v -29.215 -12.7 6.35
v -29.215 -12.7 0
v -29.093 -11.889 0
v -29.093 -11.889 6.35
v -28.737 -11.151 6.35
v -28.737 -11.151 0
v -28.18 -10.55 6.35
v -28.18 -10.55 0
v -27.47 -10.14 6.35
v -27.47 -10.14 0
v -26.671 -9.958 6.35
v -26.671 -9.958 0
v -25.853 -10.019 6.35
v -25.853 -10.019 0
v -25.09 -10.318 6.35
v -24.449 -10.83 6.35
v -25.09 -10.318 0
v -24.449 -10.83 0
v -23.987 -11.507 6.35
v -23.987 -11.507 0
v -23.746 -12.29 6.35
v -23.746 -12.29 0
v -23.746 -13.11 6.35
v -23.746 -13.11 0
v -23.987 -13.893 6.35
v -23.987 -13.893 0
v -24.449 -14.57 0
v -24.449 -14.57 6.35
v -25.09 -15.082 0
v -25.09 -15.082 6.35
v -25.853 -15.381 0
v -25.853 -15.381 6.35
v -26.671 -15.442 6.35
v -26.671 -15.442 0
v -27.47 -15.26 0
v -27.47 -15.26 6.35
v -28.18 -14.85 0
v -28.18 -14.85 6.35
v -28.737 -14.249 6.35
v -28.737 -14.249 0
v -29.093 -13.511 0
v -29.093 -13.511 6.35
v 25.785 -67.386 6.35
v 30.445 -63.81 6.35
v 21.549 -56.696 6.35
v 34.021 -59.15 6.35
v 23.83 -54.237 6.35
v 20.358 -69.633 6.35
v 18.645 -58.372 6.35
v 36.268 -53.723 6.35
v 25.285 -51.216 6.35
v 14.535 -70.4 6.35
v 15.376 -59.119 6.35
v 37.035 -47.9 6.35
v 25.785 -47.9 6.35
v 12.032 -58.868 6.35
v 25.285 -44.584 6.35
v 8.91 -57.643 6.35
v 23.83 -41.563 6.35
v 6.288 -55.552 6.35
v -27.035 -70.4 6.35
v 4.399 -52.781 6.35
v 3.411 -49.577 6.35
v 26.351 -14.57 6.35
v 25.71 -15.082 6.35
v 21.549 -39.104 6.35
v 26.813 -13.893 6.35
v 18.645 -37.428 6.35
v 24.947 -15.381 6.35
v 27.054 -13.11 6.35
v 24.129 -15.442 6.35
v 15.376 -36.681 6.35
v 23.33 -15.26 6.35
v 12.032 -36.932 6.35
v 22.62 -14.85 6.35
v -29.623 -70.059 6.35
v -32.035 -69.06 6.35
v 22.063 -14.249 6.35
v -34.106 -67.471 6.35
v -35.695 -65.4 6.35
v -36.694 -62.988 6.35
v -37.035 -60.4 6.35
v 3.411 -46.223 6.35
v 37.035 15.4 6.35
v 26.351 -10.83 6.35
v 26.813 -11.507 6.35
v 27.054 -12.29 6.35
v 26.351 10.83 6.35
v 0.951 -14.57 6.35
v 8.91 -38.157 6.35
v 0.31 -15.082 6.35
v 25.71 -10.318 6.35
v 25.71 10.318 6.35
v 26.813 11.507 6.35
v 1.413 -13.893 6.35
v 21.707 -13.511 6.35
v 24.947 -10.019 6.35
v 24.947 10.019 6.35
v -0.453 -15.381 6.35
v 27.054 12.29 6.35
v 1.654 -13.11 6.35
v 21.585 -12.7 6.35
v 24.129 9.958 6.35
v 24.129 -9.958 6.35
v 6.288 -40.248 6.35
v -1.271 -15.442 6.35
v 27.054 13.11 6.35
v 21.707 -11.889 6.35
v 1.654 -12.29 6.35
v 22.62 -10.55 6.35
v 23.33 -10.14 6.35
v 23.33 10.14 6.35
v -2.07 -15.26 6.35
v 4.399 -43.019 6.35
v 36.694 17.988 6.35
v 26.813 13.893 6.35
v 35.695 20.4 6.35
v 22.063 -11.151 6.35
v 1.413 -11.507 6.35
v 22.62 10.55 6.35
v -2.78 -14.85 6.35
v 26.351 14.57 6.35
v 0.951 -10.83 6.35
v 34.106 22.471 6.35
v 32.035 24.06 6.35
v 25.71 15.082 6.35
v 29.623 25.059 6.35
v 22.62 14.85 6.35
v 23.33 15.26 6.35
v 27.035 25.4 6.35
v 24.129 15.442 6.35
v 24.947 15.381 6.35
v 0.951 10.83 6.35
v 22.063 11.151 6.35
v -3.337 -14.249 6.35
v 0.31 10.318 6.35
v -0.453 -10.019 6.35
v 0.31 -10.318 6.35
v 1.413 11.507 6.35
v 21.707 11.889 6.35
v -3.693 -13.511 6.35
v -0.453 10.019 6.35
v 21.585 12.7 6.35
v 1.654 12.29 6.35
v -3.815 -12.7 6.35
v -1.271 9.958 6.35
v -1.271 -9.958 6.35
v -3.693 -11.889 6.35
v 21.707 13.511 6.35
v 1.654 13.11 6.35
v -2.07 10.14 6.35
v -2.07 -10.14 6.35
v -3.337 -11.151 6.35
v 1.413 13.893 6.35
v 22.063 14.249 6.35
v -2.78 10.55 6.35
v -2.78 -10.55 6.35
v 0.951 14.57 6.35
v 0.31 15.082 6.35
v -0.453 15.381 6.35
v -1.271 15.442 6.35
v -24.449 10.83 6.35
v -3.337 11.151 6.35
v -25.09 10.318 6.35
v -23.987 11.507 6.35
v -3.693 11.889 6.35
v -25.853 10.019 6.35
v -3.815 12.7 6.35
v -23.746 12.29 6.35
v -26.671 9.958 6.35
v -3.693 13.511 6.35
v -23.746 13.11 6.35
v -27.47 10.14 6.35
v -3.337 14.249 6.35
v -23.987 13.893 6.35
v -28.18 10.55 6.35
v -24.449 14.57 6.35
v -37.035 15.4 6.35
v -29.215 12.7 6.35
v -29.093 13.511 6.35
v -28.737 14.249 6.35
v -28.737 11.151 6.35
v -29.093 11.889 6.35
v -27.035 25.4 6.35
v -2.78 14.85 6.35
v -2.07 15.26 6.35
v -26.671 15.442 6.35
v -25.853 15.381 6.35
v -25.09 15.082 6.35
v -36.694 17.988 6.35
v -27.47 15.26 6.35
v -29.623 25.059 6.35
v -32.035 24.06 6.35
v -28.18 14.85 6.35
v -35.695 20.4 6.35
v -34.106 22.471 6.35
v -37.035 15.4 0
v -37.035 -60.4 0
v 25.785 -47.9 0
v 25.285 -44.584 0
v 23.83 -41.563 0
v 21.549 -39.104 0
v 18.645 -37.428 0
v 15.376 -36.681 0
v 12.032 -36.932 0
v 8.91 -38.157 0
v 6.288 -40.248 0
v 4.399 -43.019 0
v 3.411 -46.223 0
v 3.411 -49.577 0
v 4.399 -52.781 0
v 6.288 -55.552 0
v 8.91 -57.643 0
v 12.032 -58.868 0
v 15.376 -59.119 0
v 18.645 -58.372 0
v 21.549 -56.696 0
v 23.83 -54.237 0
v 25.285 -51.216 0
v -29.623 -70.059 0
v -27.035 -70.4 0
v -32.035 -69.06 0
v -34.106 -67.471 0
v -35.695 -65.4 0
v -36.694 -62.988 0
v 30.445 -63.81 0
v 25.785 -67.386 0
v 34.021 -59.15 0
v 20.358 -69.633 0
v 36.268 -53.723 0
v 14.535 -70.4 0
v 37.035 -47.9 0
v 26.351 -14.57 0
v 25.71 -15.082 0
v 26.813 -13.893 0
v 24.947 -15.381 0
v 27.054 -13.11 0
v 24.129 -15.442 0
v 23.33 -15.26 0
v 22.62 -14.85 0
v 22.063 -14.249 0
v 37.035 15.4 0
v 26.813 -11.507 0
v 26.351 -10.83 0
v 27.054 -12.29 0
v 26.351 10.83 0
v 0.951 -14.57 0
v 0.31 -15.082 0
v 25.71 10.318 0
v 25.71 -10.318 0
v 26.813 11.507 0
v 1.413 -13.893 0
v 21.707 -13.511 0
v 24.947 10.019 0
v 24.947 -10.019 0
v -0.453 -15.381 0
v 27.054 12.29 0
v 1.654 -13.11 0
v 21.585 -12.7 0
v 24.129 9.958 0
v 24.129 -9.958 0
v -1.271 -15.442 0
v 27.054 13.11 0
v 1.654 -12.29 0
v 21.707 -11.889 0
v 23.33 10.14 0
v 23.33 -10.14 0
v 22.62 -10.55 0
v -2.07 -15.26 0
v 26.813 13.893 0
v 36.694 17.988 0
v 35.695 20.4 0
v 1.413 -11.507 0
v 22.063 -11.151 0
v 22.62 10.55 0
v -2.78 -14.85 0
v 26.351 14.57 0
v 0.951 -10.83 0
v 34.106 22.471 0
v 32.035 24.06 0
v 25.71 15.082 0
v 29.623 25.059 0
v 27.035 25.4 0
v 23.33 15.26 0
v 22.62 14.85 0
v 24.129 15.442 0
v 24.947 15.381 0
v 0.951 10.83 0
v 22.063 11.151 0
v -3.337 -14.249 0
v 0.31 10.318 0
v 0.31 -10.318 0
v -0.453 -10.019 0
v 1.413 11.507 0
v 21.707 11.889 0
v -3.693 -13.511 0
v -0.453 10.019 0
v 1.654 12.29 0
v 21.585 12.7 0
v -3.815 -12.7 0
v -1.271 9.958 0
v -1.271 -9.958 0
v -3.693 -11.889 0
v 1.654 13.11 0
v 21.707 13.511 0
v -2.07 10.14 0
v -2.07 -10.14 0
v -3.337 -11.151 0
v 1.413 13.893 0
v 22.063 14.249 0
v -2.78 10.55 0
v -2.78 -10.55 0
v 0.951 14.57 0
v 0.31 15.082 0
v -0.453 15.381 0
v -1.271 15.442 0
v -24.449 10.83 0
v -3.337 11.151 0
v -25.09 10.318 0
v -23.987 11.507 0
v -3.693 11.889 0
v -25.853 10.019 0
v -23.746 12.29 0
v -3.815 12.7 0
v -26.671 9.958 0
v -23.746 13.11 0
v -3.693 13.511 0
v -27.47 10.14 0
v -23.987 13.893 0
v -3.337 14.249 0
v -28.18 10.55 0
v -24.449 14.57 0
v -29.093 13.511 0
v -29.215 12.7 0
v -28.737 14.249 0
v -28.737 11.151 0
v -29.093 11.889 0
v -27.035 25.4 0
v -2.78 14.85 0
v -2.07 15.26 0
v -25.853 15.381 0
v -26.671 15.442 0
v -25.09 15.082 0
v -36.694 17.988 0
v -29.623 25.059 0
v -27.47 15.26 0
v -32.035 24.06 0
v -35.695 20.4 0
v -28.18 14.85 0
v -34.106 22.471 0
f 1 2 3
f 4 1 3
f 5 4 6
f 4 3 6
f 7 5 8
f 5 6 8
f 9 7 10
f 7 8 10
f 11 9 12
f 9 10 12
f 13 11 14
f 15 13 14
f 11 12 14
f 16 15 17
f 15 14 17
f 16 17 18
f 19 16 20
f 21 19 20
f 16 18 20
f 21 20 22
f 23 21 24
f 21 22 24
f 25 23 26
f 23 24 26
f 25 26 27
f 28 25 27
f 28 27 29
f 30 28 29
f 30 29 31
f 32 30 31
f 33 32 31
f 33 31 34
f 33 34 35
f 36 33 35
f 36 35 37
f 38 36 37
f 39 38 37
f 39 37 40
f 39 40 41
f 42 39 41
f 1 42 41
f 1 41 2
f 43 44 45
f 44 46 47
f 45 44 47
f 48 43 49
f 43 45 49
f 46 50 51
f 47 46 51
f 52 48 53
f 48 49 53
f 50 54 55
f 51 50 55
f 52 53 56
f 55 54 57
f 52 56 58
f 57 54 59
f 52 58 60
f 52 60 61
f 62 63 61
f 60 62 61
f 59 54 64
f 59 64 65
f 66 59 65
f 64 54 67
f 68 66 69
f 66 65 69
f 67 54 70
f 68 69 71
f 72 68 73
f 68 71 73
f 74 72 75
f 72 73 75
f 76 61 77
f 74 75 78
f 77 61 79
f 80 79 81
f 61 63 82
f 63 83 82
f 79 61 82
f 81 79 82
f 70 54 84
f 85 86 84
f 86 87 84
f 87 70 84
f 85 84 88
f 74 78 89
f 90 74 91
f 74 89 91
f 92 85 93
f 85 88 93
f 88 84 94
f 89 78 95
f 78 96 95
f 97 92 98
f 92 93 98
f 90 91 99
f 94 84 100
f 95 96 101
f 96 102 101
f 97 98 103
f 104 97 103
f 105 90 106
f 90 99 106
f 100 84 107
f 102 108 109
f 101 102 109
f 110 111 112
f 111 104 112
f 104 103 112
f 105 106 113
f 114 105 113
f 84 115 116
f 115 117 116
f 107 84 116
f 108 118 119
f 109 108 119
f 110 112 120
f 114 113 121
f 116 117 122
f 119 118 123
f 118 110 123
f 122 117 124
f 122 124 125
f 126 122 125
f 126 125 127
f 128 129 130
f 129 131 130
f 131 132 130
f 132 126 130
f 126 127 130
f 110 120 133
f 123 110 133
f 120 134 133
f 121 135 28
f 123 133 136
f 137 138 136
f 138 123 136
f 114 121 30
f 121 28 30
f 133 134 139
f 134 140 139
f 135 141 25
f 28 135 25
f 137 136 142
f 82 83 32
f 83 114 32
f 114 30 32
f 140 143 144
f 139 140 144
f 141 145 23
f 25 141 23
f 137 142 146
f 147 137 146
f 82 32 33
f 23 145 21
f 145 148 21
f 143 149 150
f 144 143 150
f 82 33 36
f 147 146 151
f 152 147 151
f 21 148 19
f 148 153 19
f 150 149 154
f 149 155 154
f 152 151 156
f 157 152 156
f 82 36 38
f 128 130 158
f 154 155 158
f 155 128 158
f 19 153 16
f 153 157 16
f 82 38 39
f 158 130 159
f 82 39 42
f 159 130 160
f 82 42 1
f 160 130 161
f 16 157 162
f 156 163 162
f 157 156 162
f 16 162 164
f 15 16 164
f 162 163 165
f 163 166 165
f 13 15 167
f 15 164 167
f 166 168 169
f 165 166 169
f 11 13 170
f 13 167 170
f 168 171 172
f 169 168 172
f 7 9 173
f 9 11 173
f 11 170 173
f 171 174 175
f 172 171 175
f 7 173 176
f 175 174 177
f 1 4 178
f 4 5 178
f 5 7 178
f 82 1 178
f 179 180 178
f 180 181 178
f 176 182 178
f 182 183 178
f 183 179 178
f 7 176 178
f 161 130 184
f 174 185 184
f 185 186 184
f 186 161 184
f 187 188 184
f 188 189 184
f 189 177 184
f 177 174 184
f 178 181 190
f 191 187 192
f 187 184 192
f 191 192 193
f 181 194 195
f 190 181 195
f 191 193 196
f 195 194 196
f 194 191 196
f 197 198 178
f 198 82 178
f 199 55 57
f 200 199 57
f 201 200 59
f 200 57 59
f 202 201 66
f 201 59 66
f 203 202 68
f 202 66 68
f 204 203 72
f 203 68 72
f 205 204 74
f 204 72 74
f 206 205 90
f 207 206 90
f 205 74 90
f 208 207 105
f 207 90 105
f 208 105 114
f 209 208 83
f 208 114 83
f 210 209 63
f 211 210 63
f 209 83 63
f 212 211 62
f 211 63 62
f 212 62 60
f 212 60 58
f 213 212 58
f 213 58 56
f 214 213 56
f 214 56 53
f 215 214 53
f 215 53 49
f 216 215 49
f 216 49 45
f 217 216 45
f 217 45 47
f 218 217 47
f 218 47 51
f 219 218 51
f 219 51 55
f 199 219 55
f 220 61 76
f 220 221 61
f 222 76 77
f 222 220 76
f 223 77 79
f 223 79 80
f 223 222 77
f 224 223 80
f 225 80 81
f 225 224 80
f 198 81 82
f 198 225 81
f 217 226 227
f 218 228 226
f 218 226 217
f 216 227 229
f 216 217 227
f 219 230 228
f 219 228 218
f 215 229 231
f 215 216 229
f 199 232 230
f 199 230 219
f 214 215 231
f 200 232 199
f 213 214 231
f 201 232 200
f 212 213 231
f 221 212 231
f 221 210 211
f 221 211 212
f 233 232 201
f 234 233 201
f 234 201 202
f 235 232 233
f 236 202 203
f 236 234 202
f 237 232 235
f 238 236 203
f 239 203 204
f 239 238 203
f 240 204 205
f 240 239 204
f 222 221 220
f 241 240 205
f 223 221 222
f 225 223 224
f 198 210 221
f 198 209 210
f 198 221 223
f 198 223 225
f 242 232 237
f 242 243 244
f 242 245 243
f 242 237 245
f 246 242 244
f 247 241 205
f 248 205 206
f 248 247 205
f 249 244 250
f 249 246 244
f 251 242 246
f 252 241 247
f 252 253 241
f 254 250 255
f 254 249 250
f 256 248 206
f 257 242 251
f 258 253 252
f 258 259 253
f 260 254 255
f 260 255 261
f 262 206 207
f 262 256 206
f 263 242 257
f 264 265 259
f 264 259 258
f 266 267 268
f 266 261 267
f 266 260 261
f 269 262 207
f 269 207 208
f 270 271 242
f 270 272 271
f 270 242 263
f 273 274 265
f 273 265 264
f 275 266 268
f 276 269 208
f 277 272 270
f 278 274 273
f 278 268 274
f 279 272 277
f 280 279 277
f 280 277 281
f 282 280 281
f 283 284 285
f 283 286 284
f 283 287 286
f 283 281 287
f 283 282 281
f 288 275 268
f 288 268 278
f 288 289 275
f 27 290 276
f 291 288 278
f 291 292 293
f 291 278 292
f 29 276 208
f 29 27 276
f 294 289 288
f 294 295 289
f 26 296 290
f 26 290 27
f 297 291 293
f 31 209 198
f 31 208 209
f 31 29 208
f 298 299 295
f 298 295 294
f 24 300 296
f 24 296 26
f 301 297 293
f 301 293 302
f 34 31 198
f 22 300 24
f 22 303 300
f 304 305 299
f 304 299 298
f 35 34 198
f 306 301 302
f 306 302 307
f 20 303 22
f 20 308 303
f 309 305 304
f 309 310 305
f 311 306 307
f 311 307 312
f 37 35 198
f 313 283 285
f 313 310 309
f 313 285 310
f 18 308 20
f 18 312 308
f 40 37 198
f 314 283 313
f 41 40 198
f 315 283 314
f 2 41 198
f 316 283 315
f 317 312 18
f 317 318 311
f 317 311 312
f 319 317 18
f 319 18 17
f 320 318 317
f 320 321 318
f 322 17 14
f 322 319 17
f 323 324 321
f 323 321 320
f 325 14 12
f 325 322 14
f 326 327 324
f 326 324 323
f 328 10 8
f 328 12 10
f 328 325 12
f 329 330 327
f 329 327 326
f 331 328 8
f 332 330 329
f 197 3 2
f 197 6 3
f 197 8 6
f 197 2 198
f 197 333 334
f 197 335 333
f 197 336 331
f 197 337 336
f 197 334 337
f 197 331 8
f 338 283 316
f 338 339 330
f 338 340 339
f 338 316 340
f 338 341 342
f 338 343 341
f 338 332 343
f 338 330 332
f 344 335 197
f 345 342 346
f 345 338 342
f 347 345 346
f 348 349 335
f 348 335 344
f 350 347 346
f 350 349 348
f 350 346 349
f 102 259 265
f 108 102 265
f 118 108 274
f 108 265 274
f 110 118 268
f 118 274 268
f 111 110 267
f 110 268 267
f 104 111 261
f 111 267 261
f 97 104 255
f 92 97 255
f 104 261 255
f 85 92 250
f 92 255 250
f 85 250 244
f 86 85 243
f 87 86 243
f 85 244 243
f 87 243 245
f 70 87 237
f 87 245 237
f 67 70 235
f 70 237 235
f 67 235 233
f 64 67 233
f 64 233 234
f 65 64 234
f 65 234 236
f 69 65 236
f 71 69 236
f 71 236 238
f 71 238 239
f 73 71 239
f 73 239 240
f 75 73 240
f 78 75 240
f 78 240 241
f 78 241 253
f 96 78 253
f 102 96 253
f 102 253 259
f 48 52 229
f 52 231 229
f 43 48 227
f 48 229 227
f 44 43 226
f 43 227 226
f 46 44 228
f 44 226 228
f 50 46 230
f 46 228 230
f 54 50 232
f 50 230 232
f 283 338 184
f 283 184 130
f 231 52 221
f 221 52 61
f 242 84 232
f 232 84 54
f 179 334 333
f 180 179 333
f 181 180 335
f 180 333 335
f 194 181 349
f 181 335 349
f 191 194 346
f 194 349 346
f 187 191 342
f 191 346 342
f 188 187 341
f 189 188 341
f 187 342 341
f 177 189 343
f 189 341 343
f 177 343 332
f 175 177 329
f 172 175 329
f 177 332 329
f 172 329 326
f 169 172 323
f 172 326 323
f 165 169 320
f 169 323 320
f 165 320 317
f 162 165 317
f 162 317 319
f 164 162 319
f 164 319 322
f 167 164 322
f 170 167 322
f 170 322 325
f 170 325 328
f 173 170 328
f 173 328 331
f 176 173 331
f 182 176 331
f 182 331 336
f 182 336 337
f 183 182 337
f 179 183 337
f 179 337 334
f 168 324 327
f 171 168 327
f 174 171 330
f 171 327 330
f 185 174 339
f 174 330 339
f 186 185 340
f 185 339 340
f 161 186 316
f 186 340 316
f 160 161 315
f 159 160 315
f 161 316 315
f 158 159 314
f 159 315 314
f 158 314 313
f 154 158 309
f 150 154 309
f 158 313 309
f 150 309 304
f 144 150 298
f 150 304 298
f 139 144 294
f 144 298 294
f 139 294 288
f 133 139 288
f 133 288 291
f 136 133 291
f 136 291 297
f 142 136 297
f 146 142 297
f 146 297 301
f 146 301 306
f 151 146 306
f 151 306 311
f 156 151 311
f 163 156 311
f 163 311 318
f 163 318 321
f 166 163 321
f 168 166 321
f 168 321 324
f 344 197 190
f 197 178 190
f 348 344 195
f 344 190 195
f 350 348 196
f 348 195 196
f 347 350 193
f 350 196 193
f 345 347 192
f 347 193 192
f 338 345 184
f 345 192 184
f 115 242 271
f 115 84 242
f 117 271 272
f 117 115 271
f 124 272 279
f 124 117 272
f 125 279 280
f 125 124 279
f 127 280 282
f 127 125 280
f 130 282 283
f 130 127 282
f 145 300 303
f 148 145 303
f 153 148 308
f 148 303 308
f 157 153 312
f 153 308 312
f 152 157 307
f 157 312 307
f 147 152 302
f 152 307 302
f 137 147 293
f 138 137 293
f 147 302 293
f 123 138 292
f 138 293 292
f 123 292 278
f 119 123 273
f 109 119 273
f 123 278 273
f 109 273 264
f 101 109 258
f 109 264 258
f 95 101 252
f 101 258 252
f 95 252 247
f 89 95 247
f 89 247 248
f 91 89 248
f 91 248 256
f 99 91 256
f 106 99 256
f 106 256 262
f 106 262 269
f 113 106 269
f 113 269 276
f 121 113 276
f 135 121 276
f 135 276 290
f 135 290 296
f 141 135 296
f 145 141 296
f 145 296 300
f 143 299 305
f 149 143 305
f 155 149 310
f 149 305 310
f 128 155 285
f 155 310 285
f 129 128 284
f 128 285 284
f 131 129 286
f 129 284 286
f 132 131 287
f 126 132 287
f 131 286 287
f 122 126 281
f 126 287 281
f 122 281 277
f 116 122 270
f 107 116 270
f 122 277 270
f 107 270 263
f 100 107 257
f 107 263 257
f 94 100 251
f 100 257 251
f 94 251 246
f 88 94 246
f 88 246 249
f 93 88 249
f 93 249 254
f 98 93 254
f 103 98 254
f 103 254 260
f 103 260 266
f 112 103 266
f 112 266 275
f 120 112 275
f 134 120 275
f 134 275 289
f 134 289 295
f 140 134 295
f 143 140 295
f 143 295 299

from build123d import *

# Parameters (mm, degrees)
SKETCH1_W            = 74.07
SKETCH1_H            = 50.8
BOSS_EXTRUDE1_DEPTH  = 6.35
FILLET1_R            = 10
M5_CLEARANCE_HOLE1_D = 5.5
BOSS_EXTRUDE2_DEPTH  = 6.35
SKETCH5_R            = 11.25
CUT_EXTRUDE1_DEPTH   = 7.35
FILLET2_R            = 10
FILLET3_R            = 22.5


with BuildPart() as part:
    # Sketch1 → Boss-Extrude1 (new body)
    with BuildSketch(Plane.XY):
        Rectangle(SKETCH1_W, SKETCH1_H)
    extrude(amount=BOSS_EXTRUDE1_DEPTH)

    # Fillet1
    fillet1_edges = [part.edges().sort_by_distance(p)[0] for p in [
        (-37.035, 25.4, 3.175),
        (37.035, 25.4, 3.175),
        (37.035, -25.4, 3.175),
        (-37.035, -25.4, 3.175),
    ]]
    fillet(fillet1_edges, radius=FILLET1_R)

    # M5 Clearance Hole1 (through all)
    with Locations(Plane.XY.offset(6.35)):
        with Locations((-26.465, 12.7), (-26.465, -12.7), (-1.065, -12.7), (-1.065, 12.7), (24.335, 12.7), (24.335, -12.7)):
            Hole(M5_CLEARANCE_HOLE1_D / 2)

    # Sketch4 → Boss-Extrude2 (add)
    with BuildSketch(Plane.XY.offset(6.35)):
        Polygon((37.035, -15.4), (37.035, -70.4), (-37.035, -70.4), (-37.035, -15.4), (-27.035, -25.4), (27.035, -25.4), align=None)
    extrude(amount=-BOSS_EXTRUDE2_DEPTH)

    # Sketch5 → Cut-Extrude1 (cut, through all)
    with BuildSketch(Plane.XY.offset(6.35)):
        with Locations((14.535, -47.9)):
            Circle(SKETCH5_R)
    extrude(amount=-CUT_EXTRUDE1_DEPTH, mode=Mode.SUBTRACT)

    # Fillet2
    fillet2_edges = [part.edges().sort_by_distance(p)[0] for p in [
        (-37.035, -70.4, 3.175),
    ]]
    fillet(fillet2_edges, radius=FILLET2_R)

    # Fillet3
    fillet3_edges = [part.edges().sort_by_distance(p)[0] for p in [
        (37.035, -70.4, 3.175),
    ]]
    fillet(fillet3_edges, radius=FILLET3_R)


solid = part.part
